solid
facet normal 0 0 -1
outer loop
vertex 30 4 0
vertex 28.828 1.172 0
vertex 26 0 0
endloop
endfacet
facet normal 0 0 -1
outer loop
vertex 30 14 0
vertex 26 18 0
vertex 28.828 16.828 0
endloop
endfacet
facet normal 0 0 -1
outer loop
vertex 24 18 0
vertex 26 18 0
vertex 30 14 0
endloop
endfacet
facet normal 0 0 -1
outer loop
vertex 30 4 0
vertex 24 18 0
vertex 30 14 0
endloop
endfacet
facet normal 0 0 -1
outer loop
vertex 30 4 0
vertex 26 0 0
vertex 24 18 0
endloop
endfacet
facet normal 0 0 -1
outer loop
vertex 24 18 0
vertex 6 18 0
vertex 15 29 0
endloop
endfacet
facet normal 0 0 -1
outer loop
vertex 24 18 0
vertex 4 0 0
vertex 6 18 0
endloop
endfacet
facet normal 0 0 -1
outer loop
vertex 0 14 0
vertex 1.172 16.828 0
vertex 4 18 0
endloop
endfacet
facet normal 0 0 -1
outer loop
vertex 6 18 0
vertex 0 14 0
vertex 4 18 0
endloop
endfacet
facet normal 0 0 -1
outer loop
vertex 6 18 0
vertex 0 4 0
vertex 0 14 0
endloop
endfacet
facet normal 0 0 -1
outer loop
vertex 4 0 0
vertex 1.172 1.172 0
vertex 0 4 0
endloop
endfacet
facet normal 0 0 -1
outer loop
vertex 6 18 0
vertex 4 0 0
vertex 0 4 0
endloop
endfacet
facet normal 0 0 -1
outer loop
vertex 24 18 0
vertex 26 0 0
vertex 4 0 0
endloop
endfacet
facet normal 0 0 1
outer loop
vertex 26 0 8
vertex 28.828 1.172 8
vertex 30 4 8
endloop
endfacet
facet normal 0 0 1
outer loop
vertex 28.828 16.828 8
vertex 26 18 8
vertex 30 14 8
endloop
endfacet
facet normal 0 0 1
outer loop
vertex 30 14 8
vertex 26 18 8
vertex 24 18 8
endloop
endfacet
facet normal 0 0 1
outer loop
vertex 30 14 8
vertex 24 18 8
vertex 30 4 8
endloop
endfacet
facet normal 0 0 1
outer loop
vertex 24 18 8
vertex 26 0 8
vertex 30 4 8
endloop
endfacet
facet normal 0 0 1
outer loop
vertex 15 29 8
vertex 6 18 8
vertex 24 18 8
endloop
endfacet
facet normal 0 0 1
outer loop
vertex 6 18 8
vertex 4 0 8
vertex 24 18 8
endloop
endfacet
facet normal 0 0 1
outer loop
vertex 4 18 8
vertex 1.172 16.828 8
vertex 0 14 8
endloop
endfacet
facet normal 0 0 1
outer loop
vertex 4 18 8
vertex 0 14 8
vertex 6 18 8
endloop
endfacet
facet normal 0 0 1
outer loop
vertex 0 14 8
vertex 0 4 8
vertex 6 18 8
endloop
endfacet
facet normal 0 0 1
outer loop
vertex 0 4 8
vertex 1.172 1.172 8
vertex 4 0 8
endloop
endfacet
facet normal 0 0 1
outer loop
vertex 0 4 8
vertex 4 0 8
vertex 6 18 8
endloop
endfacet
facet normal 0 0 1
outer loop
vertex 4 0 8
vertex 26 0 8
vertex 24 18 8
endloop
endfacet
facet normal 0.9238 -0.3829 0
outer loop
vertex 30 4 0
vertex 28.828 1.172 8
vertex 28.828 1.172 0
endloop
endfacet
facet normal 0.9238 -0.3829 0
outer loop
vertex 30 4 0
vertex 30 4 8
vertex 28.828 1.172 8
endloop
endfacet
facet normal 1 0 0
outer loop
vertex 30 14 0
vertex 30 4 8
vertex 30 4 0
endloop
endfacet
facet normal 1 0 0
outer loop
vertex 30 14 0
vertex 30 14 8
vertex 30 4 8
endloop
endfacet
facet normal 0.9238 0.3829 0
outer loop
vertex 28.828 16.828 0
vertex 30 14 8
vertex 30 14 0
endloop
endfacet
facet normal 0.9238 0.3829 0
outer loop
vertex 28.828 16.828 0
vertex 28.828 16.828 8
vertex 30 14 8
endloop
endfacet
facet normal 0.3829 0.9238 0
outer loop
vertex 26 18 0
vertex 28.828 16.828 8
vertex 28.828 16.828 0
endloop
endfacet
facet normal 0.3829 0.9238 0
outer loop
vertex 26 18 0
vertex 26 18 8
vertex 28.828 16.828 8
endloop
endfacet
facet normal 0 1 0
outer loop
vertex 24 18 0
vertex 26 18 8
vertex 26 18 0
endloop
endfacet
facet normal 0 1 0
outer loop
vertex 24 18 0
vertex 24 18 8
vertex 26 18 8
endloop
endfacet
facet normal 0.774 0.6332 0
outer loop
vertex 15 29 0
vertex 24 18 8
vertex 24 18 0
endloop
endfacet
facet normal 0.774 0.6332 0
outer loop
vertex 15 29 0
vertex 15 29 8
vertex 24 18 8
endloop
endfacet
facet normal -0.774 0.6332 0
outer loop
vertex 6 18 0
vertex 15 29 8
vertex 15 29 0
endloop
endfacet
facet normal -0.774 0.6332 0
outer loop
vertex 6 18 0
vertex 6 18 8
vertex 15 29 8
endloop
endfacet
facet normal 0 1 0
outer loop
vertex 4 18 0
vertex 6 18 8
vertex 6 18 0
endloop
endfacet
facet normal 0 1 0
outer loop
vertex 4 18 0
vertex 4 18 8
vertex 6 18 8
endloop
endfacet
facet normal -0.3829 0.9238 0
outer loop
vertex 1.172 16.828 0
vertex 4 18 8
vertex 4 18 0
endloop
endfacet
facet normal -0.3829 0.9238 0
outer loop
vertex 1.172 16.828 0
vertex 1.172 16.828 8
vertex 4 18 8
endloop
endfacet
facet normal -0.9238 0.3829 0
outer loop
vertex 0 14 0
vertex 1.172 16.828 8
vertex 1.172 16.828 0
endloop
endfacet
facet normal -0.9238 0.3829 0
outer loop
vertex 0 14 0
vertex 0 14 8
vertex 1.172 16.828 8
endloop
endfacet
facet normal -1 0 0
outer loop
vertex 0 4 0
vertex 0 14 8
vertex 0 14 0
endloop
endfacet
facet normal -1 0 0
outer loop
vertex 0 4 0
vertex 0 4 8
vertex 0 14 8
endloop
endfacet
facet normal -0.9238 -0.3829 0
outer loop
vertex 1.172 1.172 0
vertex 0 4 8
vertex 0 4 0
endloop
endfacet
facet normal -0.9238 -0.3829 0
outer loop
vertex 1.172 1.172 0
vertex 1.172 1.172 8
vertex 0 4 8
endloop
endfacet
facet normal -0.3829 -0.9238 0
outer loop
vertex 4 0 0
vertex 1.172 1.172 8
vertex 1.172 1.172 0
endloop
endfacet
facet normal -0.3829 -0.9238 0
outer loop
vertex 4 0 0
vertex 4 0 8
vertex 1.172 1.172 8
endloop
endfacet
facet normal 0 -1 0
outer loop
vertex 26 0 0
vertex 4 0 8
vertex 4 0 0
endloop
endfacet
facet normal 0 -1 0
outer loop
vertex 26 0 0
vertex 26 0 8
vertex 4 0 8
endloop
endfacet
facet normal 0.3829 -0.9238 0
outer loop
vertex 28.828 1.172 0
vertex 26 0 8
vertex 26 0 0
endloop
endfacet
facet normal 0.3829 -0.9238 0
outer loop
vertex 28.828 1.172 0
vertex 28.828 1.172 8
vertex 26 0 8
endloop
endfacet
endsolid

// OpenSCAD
$fn = 32;

// ----------------------------------------------------------------------
// Ratchet pawl: 30 x 18 mm body, beak 11 mm сверху
// ----------------------------------------------------------------------

// --- parameters (mm) ---
profile_height = 8;       // extrusion height
profile_points = 15;      // points of the closed outline

profile = [[0, 4], [1.172, 1.172], [4, 0], [26, 0], [28.828, 1.172], [30, 4], [30, 14], [28.828, 16.828], [26, 18], [24, 18], [15, 29], [6, 18], [4, 18], [1.172, 16.828], [0, 14]];  // single closed polygon, 15 points, counter clockwise

// --- the one profile operation ---
linear_extrude(height = profile_height) polygon(points = profile);
